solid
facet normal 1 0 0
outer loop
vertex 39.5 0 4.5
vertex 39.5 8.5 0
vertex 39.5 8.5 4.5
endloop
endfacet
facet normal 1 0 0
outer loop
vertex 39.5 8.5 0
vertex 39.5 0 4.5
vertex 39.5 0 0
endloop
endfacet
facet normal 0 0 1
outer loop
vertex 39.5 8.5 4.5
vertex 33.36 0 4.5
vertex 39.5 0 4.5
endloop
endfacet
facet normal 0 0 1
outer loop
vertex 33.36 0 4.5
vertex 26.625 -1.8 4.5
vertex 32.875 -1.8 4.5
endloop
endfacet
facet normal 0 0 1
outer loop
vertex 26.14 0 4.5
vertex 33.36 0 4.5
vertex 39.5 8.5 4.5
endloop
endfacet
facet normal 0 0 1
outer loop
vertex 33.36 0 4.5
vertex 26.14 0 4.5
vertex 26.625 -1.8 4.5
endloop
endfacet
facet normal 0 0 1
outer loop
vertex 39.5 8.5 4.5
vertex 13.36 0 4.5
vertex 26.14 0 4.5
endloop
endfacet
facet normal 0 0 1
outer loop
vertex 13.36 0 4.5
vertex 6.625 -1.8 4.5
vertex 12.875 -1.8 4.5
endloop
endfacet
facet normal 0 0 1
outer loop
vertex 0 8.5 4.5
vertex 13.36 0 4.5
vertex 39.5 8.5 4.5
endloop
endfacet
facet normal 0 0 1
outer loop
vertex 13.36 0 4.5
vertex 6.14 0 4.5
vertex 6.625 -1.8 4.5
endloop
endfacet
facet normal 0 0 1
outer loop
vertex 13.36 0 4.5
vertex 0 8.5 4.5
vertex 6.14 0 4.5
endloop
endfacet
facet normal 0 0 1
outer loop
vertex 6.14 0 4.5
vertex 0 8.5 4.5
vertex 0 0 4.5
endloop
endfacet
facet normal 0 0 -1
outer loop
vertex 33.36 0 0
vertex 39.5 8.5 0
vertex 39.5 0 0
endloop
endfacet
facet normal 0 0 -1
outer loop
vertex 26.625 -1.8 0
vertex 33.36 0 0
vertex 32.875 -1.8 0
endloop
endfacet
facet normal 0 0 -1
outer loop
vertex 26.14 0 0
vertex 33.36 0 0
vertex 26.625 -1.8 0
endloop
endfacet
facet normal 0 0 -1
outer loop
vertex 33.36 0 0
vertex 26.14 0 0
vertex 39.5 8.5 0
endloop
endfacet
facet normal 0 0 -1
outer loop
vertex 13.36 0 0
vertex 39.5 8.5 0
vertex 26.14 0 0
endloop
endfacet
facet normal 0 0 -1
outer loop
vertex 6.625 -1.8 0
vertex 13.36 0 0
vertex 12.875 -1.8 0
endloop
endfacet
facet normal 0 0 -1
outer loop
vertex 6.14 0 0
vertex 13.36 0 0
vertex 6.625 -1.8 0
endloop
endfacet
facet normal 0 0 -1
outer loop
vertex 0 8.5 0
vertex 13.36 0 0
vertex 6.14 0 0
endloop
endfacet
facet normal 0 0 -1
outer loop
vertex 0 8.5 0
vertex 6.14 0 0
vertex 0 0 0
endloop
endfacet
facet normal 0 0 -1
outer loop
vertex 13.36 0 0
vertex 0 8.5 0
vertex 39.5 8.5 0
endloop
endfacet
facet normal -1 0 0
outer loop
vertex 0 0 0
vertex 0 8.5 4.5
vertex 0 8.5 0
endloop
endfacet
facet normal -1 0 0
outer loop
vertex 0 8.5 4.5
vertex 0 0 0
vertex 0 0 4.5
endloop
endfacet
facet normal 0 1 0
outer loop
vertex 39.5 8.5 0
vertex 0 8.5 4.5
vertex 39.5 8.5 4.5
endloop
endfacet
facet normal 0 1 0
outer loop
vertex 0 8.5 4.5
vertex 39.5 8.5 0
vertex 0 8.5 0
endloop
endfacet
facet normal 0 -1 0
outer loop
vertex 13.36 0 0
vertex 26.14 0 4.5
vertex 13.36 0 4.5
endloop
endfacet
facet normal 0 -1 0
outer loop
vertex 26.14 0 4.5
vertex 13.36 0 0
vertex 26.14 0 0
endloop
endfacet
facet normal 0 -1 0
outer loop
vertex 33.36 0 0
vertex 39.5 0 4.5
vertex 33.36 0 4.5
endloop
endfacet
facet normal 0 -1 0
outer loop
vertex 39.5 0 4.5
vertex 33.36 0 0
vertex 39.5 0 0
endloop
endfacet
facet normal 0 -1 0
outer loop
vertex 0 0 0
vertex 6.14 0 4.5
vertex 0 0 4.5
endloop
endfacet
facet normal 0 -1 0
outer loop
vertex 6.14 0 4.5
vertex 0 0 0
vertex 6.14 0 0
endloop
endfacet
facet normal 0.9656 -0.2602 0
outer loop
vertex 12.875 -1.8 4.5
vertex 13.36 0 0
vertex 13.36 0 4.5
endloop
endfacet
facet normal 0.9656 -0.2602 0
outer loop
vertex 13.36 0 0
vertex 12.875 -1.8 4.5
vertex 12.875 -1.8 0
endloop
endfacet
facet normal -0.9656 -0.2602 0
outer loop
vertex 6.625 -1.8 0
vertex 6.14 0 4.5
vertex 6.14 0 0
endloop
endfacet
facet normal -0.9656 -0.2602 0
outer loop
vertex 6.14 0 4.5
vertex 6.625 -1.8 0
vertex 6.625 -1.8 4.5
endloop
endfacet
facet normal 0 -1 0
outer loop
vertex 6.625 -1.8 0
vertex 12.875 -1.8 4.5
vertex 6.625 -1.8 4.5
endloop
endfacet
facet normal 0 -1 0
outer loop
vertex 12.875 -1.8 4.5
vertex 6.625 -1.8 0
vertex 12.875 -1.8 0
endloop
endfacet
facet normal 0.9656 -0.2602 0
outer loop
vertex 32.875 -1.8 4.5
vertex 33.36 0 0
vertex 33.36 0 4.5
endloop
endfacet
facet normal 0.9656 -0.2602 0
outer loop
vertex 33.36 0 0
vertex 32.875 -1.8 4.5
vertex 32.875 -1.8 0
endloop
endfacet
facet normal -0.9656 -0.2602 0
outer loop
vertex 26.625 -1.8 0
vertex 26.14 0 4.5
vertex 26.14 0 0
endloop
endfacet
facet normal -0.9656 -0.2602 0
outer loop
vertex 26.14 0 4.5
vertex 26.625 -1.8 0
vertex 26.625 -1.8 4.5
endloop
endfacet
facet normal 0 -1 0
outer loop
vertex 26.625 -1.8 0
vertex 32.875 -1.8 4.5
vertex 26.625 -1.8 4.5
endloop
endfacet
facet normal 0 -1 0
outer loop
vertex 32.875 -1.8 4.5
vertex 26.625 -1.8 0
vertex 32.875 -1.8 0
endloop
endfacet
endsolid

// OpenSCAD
include <../libs/hardware-recess.scad>;

    cube([39.5, 8.5, 4.5]);
    translate([-0.25, 0, 0])
        rotate([90, 0 ,0])
            alu_connector(4.5, 0);
    translate([19.75, 0, 0])
        rotate([90, 0 ,0])
            alu_connector(4.5, 0);
